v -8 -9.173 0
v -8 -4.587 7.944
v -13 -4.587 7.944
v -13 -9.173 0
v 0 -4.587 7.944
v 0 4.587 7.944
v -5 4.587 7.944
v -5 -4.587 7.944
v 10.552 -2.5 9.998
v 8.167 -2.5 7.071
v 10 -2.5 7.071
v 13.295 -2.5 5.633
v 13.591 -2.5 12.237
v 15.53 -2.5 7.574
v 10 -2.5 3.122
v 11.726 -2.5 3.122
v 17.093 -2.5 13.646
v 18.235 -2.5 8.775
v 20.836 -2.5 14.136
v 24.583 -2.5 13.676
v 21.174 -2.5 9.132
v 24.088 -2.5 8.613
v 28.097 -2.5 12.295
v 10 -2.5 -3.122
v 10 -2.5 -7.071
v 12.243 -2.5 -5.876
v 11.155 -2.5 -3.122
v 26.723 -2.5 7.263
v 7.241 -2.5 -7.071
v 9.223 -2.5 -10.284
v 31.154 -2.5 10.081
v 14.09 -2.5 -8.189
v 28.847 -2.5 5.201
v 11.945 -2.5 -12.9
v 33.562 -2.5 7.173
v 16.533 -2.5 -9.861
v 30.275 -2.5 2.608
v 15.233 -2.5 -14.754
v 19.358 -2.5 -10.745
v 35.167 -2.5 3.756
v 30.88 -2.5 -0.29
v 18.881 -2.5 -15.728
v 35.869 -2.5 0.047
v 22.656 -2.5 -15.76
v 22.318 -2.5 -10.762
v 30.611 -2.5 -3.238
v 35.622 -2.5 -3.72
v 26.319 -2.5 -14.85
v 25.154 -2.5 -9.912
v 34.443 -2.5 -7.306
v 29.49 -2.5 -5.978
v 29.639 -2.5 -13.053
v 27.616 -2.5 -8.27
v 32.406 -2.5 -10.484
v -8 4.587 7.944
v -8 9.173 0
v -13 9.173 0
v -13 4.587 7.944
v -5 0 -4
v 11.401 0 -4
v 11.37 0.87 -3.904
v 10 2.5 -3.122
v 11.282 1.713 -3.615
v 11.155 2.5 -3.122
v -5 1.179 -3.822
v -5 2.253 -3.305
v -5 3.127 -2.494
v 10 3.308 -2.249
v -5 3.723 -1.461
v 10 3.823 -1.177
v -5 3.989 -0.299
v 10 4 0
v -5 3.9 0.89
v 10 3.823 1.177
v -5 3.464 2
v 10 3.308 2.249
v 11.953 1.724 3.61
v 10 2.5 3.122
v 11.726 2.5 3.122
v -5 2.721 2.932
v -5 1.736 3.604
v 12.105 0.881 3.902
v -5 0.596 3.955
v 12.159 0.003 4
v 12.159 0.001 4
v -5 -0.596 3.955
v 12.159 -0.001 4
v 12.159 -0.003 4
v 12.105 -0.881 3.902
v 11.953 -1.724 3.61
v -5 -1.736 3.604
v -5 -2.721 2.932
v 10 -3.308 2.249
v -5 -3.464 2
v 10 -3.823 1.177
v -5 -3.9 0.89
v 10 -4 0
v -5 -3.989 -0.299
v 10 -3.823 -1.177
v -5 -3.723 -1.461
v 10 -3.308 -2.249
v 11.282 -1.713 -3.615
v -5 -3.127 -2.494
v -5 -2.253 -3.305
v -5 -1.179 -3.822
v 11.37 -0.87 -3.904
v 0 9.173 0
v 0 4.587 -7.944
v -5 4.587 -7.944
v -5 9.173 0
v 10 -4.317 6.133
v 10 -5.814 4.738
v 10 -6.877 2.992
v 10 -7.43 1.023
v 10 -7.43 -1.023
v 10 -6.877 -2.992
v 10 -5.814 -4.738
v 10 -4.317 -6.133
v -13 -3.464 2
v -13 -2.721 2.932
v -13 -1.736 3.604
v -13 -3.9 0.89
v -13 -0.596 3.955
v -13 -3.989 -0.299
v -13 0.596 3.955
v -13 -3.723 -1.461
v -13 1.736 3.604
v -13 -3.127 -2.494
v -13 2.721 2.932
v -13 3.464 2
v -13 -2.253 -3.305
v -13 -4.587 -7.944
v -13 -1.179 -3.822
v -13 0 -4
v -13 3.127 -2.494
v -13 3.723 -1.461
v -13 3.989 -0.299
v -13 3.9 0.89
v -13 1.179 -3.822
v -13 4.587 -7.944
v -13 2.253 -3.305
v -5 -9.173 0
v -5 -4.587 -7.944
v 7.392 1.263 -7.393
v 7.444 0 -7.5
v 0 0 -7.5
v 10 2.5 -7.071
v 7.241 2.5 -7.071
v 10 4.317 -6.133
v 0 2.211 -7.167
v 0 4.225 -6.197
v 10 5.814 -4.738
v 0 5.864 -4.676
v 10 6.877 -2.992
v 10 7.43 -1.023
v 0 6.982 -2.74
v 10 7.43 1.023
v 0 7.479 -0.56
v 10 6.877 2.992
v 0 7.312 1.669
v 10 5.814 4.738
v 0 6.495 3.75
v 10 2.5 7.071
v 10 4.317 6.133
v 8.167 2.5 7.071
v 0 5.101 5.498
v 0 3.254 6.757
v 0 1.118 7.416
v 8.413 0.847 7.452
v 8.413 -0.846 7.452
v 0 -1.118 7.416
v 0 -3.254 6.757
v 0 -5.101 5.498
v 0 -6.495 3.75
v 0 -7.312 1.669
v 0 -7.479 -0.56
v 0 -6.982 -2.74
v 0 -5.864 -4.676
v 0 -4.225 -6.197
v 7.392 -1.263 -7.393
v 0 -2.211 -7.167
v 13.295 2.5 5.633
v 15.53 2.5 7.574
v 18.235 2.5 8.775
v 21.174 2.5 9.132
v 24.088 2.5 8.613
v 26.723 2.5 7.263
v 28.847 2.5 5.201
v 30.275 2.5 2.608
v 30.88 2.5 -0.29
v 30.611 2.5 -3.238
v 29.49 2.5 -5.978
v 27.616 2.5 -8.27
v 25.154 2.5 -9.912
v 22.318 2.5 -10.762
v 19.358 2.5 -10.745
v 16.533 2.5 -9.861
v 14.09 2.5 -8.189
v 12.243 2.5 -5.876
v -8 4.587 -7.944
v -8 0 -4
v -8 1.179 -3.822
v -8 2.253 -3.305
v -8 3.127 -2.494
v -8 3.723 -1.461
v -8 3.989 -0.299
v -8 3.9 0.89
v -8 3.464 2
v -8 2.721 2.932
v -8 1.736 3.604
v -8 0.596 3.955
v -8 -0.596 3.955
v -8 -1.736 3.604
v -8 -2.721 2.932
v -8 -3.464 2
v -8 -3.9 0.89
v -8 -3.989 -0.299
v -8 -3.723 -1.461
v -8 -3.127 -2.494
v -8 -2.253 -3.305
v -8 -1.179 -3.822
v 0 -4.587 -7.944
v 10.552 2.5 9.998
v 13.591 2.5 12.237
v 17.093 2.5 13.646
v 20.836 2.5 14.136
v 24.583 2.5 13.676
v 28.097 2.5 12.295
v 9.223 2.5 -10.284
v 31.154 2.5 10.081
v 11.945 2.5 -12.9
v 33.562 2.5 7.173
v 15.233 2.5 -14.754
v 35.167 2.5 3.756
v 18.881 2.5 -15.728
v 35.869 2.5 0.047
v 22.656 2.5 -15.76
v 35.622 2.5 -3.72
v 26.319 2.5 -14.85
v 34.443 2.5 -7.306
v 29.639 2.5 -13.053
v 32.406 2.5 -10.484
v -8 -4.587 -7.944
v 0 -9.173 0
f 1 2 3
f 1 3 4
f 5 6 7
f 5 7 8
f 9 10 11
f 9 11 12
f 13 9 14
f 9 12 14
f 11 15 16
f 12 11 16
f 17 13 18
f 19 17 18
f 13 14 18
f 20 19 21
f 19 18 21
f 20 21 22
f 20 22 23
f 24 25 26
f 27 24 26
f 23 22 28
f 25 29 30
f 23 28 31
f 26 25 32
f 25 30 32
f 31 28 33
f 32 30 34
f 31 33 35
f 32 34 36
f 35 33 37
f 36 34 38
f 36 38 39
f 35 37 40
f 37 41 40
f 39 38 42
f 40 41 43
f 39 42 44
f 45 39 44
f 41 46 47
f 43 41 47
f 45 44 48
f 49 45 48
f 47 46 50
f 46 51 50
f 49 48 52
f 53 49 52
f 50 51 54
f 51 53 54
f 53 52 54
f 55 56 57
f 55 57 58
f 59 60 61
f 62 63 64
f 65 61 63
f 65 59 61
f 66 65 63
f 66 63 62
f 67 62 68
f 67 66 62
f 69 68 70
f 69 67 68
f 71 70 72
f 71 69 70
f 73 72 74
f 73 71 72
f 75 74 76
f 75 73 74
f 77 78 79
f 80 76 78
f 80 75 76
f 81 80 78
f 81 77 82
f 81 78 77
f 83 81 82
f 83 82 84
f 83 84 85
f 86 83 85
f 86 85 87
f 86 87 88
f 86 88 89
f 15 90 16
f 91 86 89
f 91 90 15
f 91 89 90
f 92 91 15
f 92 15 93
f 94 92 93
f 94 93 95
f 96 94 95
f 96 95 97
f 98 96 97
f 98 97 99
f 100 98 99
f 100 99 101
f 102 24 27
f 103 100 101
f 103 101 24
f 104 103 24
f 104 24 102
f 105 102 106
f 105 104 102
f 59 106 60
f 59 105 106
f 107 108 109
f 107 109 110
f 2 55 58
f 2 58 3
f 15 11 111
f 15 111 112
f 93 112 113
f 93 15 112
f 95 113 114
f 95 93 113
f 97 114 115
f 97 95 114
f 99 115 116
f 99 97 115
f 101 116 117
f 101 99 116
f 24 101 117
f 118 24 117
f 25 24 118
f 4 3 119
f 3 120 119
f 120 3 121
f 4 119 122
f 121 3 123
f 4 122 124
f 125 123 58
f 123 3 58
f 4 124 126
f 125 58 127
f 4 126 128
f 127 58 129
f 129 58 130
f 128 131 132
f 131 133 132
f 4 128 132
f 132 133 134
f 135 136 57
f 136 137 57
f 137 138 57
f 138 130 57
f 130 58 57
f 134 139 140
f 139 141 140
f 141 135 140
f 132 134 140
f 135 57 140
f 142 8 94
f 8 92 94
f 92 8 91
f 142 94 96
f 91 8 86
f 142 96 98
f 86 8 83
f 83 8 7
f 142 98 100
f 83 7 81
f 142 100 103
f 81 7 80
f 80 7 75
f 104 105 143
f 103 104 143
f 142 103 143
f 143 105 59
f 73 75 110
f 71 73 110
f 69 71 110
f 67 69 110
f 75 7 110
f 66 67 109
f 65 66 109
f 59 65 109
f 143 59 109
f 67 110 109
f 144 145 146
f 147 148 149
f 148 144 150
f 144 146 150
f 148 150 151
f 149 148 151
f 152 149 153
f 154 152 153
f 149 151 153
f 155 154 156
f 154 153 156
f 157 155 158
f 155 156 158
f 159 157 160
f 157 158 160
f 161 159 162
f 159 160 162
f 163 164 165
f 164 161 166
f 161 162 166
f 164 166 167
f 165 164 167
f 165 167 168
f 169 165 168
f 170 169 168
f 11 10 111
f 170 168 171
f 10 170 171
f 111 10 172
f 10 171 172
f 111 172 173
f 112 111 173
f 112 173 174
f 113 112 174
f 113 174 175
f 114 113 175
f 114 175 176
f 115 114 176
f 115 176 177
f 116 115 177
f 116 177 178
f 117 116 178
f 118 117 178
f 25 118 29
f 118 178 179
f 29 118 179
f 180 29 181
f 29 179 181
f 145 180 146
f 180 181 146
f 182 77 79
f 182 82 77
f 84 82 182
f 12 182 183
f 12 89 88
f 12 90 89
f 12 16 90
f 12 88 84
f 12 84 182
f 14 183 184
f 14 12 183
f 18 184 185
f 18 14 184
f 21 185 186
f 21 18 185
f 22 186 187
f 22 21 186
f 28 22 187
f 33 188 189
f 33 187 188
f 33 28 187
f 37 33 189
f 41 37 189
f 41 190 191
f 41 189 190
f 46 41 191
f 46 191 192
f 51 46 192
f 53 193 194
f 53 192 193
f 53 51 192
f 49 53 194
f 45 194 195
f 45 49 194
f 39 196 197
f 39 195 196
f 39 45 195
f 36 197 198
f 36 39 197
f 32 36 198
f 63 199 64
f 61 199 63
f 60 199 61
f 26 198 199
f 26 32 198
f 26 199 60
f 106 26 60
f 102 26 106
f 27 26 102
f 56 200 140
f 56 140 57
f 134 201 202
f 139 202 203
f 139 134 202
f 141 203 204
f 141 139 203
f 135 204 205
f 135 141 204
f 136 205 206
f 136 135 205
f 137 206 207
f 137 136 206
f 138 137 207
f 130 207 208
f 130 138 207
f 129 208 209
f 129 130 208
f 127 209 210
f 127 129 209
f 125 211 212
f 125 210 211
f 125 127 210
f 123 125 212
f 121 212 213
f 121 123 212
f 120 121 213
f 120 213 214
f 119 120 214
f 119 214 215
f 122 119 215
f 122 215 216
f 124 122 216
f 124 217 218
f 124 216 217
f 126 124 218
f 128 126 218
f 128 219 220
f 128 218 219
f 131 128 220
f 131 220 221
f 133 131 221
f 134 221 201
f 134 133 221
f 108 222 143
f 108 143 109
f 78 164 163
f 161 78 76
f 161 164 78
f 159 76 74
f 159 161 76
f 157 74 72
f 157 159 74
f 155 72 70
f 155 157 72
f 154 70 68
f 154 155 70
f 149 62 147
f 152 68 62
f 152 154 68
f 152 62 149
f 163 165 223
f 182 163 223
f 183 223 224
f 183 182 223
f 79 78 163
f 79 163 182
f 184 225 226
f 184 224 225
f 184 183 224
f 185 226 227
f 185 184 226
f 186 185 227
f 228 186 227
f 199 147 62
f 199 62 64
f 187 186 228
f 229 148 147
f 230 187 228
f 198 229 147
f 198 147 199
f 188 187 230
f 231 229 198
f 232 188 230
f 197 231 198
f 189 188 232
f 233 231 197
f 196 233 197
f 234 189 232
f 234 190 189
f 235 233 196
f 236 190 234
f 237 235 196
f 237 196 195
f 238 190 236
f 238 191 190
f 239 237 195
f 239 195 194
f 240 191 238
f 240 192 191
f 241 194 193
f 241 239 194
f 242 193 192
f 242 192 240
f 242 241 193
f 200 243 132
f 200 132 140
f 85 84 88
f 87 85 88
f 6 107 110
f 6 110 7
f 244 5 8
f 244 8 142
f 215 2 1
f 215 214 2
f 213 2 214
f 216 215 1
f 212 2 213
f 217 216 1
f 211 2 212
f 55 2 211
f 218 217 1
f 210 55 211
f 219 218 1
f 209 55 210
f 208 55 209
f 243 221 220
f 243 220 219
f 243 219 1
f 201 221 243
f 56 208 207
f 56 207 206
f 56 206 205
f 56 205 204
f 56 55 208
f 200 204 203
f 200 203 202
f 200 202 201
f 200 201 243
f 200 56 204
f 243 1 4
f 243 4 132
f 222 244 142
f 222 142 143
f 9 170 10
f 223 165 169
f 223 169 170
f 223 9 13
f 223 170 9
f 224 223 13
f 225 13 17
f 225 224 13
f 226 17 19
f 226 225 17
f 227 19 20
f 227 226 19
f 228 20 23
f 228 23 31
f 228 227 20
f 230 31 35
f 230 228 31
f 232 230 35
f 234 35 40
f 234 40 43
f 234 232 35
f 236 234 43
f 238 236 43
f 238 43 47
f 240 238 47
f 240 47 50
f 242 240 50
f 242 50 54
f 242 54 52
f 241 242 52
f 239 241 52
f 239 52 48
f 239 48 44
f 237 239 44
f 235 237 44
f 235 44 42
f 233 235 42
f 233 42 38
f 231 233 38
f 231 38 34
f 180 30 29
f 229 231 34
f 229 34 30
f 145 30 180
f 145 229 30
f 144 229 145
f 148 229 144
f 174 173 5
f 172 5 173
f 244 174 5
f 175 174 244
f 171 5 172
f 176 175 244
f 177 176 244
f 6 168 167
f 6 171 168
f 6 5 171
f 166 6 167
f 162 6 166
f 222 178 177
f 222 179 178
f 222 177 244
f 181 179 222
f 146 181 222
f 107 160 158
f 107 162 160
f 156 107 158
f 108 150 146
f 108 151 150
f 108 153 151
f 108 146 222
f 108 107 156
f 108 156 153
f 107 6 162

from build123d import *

# Parameters (mm, degrees)
SKETCH1_R           = 7.5
SKETCH1_R_2         = 4
BOSS_EXTRUDE1_DEPTH = 10
SKETCH2_R           = 15
SKETCH2_R_2         = 10
BOSS_EXTRUDE2_DEPTH = 2.5
BOSS_EXTRUDE3_DEPTH = 5
BOSS_EXTRUDE4_START = -8
BOSS_EXTRUDE4_DEPTH = 5
CUT_EXTRUDE1_START  = -13
SKETCH1_3_R         = 4
CUT_EXTRUDE1_DEPTH  = 25.159292


with BuildPart() as part:
    # Sketch1 → Boss-Extrude1 (new body)
    with BuildSketch(Plane(origin=(0, 0, 0), x_dir=(0, 0, -1), z_dir=(1, 0, 0))):
        Circle(SKETCH1_R)
        Circle(SKETCH1_R_2, mode=Mode.SUBTRACT)
    extrude(amount=BOSS_EXTRUDE1_DEPTH)

    # Sketch2 → Boss-Extrude2 (add, symmetric)
    with BuildSketch(Plane(origin=(0, 0, 0), x_dir=(1, 0, 0), z_dir=(0, 1, 0))):
        with Locations((20.896682981, 0.863950162)):
            Circle(SKETCH2_R)
        with Locations(Location((20.896682981, 0.863950162, 0), (0, 0, 270))):
            Circle(SKETCH2_R_2, mode=Mode.SUBTRACT)
    extrude(amount=BOSS_EXTRUDE2_DEPTH, both=True)

    # Sketch3 → Boss-Extrude3 (add)
    with BuildSketch(Plane(origin=(0, 0, 0), x_dir=(0, 0, -1), z_dir=(1, 0, 0))):
        Polygon((0, -9.173417626), (7.944412704, -4.586708813), (7.944412704, 4.586708813), (0, 9.173417626), (-7.944412704, 4.586708813), (-7.944412704, -4.586708813), align=None)
    extrude(amount=-BOSS_EXTRUDE3_DEPTH)


with BuildPart() as body_2:
    # Sketch3<2> → Boss-Extrude4 (new body)
    with BuildSketch(Plane(origin=(0, 0, 0), x_dir=(0, 0, -1), z_dir=(1, 0, 0)).offset(BOSS_EXTRUDE4_START)):
        Polygon((0, -9.173417626), (7.944412704, -4.586708813), (7.944412704, 4.586708813), (0, 9.173417626), (-7.944412704, 4.586708813), (-7.944412704, -4.586708813), align=None)
    extrude(amount=-BOSS_EXTRUDE4_DEPTH)


with BuildPart() as cut_extrude1_tool:
    # Sketch1<3> → Cut-Extrude1 (new body)
    with BuildSketch(Plane(origin=(0, 0, 0), x_dir=(0, 0, -1), z_dir=(1, 0, 0)).offset(CUT_EXTRUDE1_START)):
        Circle(SKETCH1_3_R)
    extrude(amount=CUT_EXTRUDE1_DEPTH)


with BuildPart() as part_1:
    add(part.part)

    # Cut-Extrude1: cut by cut_extrude1_tool
    add(cut_extrude1_tool.part, mode=Mode.SUBTRACT)


with BuildPart() as body_2_1:
    add(body_2.part)

    # Cut-Extrude1: cut by cut_extrude1_tool
    add(cut_extrude1_tool.part, mode=Mode.SUBTRACT)


solid = Compound([part_1.part, body_2_1.part])
